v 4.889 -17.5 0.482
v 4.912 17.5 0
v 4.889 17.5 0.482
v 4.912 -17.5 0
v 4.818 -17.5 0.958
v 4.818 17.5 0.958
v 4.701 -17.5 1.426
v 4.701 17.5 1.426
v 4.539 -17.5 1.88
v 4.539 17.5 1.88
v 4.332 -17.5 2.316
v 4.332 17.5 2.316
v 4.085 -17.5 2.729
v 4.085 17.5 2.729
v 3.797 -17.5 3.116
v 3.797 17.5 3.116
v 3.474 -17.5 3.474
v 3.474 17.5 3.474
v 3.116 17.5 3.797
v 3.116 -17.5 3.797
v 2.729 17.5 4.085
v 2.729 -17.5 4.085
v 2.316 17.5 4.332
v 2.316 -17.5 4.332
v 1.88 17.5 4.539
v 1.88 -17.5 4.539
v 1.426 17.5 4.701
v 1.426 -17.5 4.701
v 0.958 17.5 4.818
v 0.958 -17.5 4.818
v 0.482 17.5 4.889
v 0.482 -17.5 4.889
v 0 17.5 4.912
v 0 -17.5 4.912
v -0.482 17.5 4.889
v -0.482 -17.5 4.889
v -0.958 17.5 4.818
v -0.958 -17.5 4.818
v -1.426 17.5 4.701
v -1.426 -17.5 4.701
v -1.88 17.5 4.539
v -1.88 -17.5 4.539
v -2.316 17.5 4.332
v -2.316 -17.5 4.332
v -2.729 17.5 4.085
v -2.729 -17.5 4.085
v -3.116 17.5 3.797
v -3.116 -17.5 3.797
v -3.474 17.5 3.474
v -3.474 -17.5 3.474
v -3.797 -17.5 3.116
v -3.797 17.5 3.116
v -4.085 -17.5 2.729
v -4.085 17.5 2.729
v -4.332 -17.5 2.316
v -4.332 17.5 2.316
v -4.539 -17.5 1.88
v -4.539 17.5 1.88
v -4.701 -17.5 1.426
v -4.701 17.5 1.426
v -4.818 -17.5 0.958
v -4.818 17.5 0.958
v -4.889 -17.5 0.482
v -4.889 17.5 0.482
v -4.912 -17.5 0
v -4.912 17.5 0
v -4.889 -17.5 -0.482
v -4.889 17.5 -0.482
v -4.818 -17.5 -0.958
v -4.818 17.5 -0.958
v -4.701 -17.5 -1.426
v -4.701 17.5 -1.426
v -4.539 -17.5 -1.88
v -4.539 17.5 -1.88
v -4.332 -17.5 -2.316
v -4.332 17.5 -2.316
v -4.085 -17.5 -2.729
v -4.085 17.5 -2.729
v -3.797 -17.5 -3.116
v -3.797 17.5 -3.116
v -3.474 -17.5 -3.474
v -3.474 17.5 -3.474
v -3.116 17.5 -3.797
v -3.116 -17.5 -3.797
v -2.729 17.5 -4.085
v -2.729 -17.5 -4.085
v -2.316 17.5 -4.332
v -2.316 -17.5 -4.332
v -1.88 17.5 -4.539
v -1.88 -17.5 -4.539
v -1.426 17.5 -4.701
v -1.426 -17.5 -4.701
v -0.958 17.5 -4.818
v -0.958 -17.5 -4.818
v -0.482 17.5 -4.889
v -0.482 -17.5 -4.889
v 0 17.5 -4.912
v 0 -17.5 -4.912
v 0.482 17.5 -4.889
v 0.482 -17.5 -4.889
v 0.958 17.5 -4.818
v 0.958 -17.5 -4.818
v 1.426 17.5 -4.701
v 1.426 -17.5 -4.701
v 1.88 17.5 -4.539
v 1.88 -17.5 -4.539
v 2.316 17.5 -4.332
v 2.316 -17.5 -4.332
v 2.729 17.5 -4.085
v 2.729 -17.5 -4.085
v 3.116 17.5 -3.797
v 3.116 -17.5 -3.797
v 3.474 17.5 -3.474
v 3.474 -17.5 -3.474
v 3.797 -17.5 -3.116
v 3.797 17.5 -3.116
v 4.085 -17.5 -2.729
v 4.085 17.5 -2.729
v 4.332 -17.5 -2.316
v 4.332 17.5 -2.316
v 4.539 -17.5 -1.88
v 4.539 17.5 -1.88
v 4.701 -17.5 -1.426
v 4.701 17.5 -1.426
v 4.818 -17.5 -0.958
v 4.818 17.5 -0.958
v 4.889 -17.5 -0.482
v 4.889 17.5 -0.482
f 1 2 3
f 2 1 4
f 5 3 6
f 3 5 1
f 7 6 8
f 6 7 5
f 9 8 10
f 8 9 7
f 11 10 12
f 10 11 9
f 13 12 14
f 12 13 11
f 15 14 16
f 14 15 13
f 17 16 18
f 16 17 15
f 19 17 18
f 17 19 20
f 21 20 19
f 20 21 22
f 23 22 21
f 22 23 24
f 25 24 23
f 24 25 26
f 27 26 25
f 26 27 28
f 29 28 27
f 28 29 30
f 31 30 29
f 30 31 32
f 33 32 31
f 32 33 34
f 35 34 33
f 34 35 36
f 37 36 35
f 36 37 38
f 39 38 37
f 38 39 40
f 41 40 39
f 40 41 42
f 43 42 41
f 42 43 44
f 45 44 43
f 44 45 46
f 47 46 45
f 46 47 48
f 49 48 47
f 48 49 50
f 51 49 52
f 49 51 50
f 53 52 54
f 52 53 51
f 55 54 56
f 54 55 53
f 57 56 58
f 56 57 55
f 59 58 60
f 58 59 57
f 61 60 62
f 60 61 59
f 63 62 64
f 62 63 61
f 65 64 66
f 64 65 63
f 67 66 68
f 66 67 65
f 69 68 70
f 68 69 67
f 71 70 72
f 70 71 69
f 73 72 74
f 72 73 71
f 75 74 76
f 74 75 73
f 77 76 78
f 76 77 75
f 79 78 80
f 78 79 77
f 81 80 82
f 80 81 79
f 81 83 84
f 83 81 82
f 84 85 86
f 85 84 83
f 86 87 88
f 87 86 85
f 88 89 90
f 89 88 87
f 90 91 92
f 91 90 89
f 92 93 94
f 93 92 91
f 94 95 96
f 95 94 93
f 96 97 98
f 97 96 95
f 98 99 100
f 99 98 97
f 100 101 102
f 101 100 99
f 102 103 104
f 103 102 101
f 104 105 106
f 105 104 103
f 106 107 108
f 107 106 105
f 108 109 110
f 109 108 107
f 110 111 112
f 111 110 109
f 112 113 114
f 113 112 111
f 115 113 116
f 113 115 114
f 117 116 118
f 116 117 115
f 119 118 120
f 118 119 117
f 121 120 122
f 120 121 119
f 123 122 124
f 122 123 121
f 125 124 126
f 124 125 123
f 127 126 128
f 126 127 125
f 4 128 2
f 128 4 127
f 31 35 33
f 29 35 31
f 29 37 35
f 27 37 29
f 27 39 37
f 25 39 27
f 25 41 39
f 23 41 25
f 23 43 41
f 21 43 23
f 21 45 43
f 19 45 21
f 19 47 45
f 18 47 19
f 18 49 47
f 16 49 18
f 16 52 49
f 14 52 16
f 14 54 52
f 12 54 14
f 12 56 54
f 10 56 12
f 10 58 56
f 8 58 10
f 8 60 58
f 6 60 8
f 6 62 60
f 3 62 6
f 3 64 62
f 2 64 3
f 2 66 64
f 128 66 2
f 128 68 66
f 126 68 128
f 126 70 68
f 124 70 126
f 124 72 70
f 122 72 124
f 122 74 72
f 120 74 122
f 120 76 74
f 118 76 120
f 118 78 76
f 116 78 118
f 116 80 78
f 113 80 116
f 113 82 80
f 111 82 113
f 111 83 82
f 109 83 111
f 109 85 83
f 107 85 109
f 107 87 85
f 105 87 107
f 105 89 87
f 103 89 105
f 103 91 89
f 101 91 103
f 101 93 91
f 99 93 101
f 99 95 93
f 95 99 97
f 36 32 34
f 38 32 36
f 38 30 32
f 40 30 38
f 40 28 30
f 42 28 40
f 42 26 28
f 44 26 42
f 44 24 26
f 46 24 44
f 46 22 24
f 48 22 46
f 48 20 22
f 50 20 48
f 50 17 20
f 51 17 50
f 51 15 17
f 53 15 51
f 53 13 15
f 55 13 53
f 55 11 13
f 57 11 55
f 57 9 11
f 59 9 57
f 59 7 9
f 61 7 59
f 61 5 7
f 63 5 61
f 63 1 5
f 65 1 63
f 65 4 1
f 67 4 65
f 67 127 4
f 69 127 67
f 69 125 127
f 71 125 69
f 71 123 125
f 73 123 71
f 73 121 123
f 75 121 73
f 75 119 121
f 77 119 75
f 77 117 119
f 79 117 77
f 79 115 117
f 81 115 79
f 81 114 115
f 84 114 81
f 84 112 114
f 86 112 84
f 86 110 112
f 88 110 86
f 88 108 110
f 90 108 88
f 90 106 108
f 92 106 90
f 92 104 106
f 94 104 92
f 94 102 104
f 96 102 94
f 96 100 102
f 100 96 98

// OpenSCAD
// This generates geometry for creating copper pipe fittings
// Licensed under Creative Commons: Attribution, Share-Alike
//		http://creativecommons.org/licenses/by-sa/3.0/
// For attribution you can direct people to the original file on thingiverse:
// 		http://www.thingiverse.com/thing:283551

// ================ variables

//CUSTOMIZER VARIABLES

/* [Main] */

// Rated strength
copper_pipe_class="K"; // [K,L,M,DWV]

// copper_nominal size ("inch") NOTE: All sizes may not be available for all classes,(M is missing a few smaller sizes and DWV only has a few large sizes)
copper_nom_idx=0; // [0:1/4,1:3/8,2:1/2,3:5/8,4:3/4,5:1,6:1 1/4,7:1 1/2,8:2 ,9:2 1/2,10:3]
  
// Length in mm
length=35;

// What to generate
generate=1; // [0:outside fitting,1:outside fitting - boolean diff,2:inside fitting,3:inside fitting - boolean diff,4:inside outside,5:inside outside - boolean diff]

// Tightness of fit, in mm (0=tight 0.3=snug 0.6=loose)
tightness=0.3; // 0.0,1.0

// In points per cylinder
resolution=64;

//CUSTOMIZER VARIABLES END
/* [Hidden] */

// =============== calculated variables
$fn=resolution;

// =============== program

// ---- Data
copper_nom_data=["1/4","3/8","1/2","5/8","3/4","1","1 1/4","1 1/2","2","2 1/2","3"];
copper_class_k_id_data  =[0.305,0.402,0.527,0.652,0.745,0.995,1.245,1.481,1.959,2.435,2.907];
copper_class_k_od_data  =[0.375,0.500,1.000,0.750,0.875,1.125,1.375,1.625,2.125,2.625,3.125];
copper_class_l_id_data  =[0.315,0.430,0.545,0.666,0.785,1.025,1.265,1.505,1.985,2.465,2.945];
copper_class_l_od_data  =[0.375,0.500,1.000,0.750,0.875,1.125,1.375,1.625,2.125,2.625,3.125];
copper_class_m_id_data  =[0.000,0.450,0.569,0.000,0.811,1.055,1.291,1.527,2.009,2.495,2.981];
copper_class_m_od_data  =[0.000,0.500,1.000,0.000,0.875,1.125,1.375,1.625,2.125,2.625,3.125];
copper_class_dwv_id_data=[0.000,0.000,0.000,0.000,0.000,0.000,1.295,1.541,2.041,0.000,3.030];
copper_class_dwv_od_data=[0.000,0.000,0.000,0.000,0.000,0.000,1.375,1.625,2.125,0.000,3.125];
in2mm=25.4;


//---- Functions

/////////////////////////////////////////////////////////
// module create_copper_component()
// This generates geometry for creating copper pipe fittings.
// In general, you should use create_copper() instead because it gives more options.
// copper_pipe_class = Copper pipe class ("K","L","M",or "DWV")
// copper_nom_idx = copper_nominal size index as described by copper_nom_data[] 
// length - Length in mm
// generate - What to generate:
//		0="outside fitting"
//		1="outside fitting - boolean diff"
//		2="inside fitting"
//		3="inside fitting - boolean diff"
// tightness - Tightness of fit, in mm (0=tight 0.3=snug 0.6=loose)
module create_copper_component(copper_pipe_class="K",copper_nom_idx=0,generate=0,tightness=0.02,length=35) {
	dia=
	(in2mm*(copper_pipe_class=="K" ?
		(generate==0||generate==1?copper_class_k_od_data[copper_nom_idx]:copper_class_k_id_data[copper_nom_idx])
		:
		copper_pipe_class=="L" ?
		(generate==0||generate==1?copper_class_l_od_data[copper_nom_idx]:copper_class_l_id_data[copper_nom_idx])
		:
		copper_pipe_class=="M" ?
		(generate==0||generate==1?copper_class_m_od_data[copper_nom_idx]:copper_class_m_id_data[copper_nom_idx])
		:
		(generate==0||generate==1?copper_class_dwv_od_data[copper_nom_idx]:copper_class_dwv_id_data[copper_nom_idx])
	))
	+(generate==2||generate==3?-tightness:tightness);
	echo("========== INFO ==========");
	echo(str("for ",copper_nom_data[copper_nom_idx],"in (copper_nom) pipe"));
	echo(str("created ",dia,"mm dia part"));
	echo(str("including ",(generate==2||generate==3?-tightness:tightness),"mm for fit"));
	echo("==========================");
	// now draw it
	rotate([90,0,0]) if(generate==1||generate==3){
		cylinder(r=dia/2,h=length,center=true);
	}else{
		difference() {
			cube([dia+10,dia+10,length],center=true);
			cylinder(r=dia/2,h=length*2,center=true);
		}
	}
};

/////////////////////////////////////////////////////////
// module create_copper()
// This generates geometry for creating copper pipe fittings.
// Just like create_copper_component() only adds generate options 4 and 5
// copper_pipe_class = Copper pipe class ("K","L","M",or "DWV")
// copper_nom_idx = copper_nominal size index as described by copper_nom_data[] 
// length - Length in mm
// generate - What to generate:
//		0="outside fitting"
//		1="outside fitting - boolean diff"
//		2="inside fitting"
//		3="inside fitting - boolean diff"
//		4="inside outside"
//		5="inside outside - boolean diff"
// tightness - Tightness of fit, in mm (0=tight 0.3=snug 0.6=loose)
module create_copper(copper_pipe_class="K",copper_nom_idx=0,generate=0,tightness=0.02,length=35) {
	if(generate<=3){
		create_copper_component(copper_pipe_class,copper_nom_idx,generate,tightness,length);
	}
	else if(generate==4){
		difference() {
			create_copper_component(copper_pipe_class,copper_nom_idx,1,tightness,length);
			create_copper_component(copper_pipe_class,copper_nom_idx,3,tightness,length*2);
		}
	}
	else{
		union() {
			create_copper_component(copper_pipe_class,copper_nom_idx,0,tightness,length);
			create_copper_component(copper_pipe_class,copper_nom_idx,3,tightness,length);
		}
	}
};

//---- The program
create_copper(copper_pipe_class,copper_nom_idx,generate,tightness,length);
